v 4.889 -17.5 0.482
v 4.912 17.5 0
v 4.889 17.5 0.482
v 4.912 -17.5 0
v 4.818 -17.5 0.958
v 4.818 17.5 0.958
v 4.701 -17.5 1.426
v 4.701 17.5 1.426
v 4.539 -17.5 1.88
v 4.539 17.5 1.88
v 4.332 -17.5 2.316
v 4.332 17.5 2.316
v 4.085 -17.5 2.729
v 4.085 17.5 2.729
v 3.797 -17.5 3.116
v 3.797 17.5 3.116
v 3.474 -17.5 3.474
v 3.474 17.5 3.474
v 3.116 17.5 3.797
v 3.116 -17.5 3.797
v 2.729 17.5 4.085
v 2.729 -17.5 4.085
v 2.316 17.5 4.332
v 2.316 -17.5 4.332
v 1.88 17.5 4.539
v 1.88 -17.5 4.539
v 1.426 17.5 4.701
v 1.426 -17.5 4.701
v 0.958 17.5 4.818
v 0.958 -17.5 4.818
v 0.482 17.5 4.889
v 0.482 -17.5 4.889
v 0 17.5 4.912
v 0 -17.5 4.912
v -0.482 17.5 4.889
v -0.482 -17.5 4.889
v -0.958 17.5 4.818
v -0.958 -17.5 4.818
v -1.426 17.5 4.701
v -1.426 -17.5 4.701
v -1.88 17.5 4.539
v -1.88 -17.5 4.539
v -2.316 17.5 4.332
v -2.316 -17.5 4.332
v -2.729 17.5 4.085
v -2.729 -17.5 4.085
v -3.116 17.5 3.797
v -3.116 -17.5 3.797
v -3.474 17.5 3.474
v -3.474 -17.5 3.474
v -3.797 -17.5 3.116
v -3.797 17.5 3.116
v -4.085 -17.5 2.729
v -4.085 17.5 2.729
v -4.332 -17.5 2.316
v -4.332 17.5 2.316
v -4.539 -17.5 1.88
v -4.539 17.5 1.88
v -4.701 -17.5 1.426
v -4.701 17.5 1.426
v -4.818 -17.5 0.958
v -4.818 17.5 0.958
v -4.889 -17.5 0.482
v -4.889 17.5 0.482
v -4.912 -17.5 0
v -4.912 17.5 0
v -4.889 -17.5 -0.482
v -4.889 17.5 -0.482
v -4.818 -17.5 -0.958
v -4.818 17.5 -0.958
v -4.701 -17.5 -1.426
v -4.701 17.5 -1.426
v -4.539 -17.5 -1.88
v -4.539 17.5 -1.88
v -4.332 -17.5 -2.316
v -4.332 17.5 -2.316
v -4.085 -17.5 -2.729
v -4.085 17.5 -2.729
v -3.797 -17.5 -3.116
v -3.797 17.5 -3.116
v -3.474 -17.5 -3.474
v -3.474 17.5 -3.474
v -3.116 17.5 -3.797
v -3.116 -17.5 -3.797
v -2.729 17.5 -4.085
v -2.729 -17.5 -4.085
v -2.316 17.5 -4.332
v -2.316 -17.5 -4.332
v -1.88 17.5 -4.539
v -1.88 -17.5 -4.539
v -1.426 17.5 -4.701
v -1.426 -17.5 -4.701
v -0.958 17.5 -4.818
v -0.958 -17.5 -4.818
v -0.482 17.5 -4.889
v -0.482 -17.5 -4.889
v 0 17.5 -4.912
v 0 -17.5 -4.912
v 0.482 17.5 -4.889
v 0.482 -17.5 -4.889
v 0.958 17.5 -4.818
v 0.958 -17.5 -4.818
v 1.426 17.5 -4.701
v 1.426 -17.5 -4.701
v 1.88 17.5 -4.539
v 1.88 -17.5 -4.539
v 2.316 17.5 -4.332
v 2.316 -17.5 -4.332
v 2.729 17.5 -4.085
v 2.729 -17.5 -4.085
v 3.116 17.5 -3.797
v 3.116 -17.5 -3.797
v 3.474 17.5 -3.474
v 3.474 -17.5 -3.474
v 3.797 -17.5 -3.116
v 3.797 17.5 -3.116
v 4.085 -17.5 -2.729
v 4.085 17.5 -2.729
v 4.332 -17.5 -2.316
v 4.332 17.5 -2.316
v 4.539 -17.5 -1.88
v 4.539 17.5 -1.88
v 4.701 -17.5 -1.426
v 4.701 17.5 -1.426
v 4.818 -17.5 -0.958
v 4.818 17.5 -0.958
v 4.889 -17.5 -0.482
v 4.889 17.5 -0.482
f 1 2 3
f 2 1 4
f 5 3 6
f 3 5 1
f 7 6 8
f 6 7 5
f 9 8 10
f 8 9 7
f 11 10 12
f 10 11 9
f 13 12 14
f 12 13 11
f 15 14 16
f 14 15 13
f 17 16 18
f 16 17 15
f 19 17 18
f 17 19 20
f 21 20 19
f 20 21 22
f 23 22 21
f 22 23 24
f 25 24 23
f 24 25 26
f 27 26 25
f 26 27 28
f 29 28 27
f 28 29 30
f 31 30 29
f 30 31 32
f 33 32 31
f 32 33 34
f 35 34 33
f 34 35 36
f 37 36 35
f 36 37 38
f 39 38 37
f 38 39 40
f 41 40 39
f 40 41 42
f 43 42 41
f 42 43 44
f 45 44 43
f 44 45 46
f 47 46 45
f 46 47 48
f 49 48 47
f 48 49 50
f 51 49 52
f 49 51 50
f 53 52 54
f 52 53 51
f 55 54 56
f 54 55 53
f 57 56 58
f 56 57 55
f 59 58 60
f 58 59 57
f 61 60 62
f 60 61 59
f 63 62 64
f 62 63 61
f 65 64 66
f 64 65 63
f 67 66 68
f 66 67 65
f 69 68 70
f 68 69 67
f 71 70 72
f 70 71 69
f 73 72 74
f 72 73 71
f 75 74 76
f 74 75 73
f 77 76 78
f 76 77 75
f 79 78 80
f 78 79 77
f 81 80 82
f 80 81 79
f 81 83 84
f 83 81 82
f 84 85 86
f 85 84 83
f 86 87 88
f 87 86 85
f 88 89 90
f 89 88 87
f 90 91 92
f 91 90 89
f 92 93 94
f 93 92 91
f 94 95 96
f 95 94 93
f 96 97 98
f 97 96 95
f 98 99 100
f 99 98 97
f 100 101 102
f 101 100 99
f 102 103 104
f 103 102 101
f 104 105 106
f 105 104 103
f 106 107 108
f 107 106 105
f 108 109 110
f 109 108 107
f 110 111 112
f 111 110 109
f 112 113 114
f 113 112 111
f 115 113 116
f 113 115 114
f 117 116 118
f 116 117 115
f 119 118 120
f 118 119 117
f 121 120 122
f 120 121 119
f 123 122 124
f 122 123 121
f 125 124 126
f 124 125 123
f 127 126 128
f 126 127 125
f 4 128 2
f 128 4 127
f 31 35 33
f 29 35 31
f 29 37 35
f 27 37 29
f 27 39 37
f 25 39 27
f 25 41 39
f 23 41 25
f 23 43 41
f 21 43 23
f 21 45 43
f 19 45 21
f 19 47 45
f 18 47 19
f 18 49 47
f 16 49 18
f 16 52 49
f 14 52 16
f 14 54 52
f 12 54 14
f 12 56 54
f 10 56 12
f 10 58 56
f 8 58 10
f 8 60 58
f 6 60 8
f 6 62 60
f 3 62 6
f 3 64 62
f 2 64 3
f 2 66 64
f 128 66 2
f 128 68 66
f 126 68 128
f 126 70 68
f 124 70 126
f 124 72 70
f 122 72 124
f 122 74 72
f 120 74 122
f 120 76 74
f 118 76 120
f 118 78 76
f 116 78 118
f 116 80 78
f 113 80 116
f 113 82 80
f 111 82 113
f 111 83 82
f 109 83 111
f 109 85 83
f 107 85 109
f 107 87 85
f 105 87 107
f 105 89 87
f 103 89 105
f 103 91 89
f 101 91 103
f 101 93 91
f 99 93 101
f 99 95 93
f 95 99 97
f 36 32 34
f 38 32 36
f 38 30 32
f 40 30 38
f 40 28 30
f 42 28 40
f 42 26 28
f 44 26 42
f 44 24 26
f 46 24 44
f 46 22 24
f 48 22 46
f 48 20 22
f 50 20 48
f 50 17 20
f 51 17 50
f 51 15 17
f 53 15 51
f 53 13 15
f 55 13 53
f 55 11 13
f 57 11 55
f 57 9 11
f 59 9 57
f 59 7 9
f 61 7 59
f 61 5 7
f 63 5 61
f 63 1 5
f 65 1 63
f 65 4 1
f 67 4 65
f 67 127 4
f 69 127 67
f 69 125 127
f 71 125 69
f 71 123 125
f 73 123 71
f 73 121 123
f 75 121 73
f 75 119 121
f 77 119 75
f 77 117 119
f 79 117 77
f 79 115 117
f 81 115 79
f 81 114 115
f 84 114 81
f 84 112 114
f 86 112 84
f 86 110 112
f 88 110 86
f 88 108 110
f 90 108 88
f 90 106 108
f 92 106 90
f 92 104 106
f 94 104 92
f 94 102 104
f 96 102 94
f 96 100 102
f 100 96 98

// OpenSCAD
// This generates geometry for creating copper pipe fittings
// Licensed under Creative Commons: Attribution, Share-Alike
//		http://creativecommons.org/licenses/by-sa/3.0/
// For attribution you can direct people to the original file on thingiverse:
// 		http://www.thingiverse.com/thing:283551

// ================ variables

//CUSTOMIZER VARIABLES

/* [Main] */

// Rated strength
copper_pipe_class="K"; // [K,L,M,DWV]

// copper_nominal size ("inch") NOTE: All sizes may not be available for all classes,(M is missing a few smaller sizes and DWV only has a few large sizes)
copper_nom_idx=0; // [0:1/4,1:3/8,2:1/2,3:5/8,4:3/4,5:1,6:1 1/4,7:1 1/2,8:2 ,9:2 1/2,10:3]
  
// Length in mm
length=35;

// What to generate
generate=1; // [0:outside fitting,1:outside fitting - boolean diff,2:inside fitting,3:inside fitting - boolean diff,4:inside outside,5:inside outside - boolean diff]

// Tightness of fit, in mm (0=tight 0.3=snug 0.6=loose)
tightness=0.3; // 0.0,1.0

// In points per cylinder
resolution=64;

//CUSTOMIZER VARIABLES END
/* [Hidden] */

// =============== calculated variables
$fn=resolution;

// =============== program

// ---- Data
copper_nom_data=["1/4","3/8","1/2","5/8","3/4","1","1 1/4","1 1/2","2","2 1/2","3"];
copper_class_k_id_data  =[0.305,0.402,0.527,0.652,0.745,0.995,1.245,1.481,1.959,2.435,2.907];
copper_class_k_od_data  =[0.375,0.500,1.000,0.750,0.875,1.125,1.375,1.625,2.125,2.625,3.125];
copper_class_l_id_data  =[0.315,0.430,0.545,0.666,0.785,1.025,1.265,1.505,1.985,2.465,2.945];
copper_class_l_od_data  =[0.375,0.500,1.000,0.750,0.875,1.125,1.375,1.625,2.125,2.625,3.125];
copper_class_m_id_data  =[0.000,0.450,0.569,0.000,0.811,1.055,1.291,1.527,2.009,2.495,2.981];
copper_class_m_od_data  =[0.000,0.500,1.000,0.000,0.875,1.125,1.375,1.625,2.125,2.625,3.125];
copper_class_dwv_id_data=[0.000,0.000,0.000,0.000,0.000,0.000,1.295,1.541,2.041,0.000,3.030];
copper_class_dwv_od_data=[0.000,0.000,0.000,0.000,0.000,0.000,1.375,1.625,2.125,0.000,3.125];
in2mm=25.4;


//---- Functions

/////////////////////////////////////////////////////////
// module create_copper_component()
// This generates geometry for creating copper pipe fittings.
// In general, you should use create_copper() instead because it gives more options.
// copper_pipe_class = Copper pipe class ("K","L","M",or "DWV")
// copper_nom_idx = copper_nominal size index as described by copper_nom_data[] 
// length - Length in mm
// generate - What to generate:
//		0="outside fitting"
//		1="outside fitting - boolean diff"
//		2="inside fitting"
//		3="inside fitting - boolean diff"
// tightness - Tightness of fit, in mm (0=tight 0.3=snug 0.6=loose)
module create_copper_component(copper_pipe_class="K",copper_nom_idx=0,generate=0,tightness=0.02,length=35) {
	dia=
	(in2mm*(copper_pipe_class=="K" ?
		(generate==0||generate==1?copper_class_k_od_data[copper_nom_idx]:copper_class_k_id_data[copper_nom_idx])
		:
		copper_pipe_class=="L" ?
		(generate==0||generate==1?copper_class_l_od_data[copper_nom_idx]:copper_class_l_id_data[copper_nom_idx])
		:
		copper_pipe_class=="M" ?
		(generate==0||generate==1?copper_class_m_od_data[copper_nom_idx]:copper_class_m_id_data[copper_nom_idx])
		:
		(generate==0||generate==1?copper_class_dwv_od_data[copper_nom_idx]:copper_class_dwv_id_data[copper_nom_idx])
	))
	+(generate==2||generate==3?-tightness:tightness);
	echo("========== INFO ==========");
	echo(str("for ",copper_nom_data[copper_nom_idx],"in (copper_nom) pipe"));
	echo(str("created ",dia,"mm dia part"));
	echo(str("including ",(generate==2||generate==3?-tightness:tightness),"mm for fit"));
	echo("==========================");
	// now draw it
	rotate([90,0,0]) if(generate==1||generate==3){
		cylinder(r=dia/2,h=length,center=true);
	}else{
		difference() {
			cube([dia+10,dia+10,length],center=true);
			cylinder(r=dia/2,h=length*2,center=true);
		}
	}
};

/////////////////////////////////////////////////////////
// module create_copper()
// This generates geometry for creating copper pipe fittings.
// Just like create_copper_component() only adds generate options 4 and 5
// copper_pipe_class = Copper pipe class ("K","L","M",or "DWV")
// copper_nom_idx = copper_nominal size index as described by copper_nom_data[] 
// length - Length in mm
// generate - What to generate:
//		0="outside fitting"
//		1="outside fitting - boolean diff"
//		2="inside fitting"
//		3="inside fitting - boolean diff"
//		4="inside outside"
//		5="inside outside - boolean diff"
// tightness - Tightness of fit, in mm (0=tight 0.3=snug 0.6=loose)
module create_copper(copper_pipe_class="K",copper_nom_idx=0,generate=0,tightness=0.02,length=35) {
	if(generate<=3){
		create_copper_component(copper_pipe_class,copper_nom_idx,generate,tightness,length);
	}
	else if(generate==4){
		difference() {
			create_copper_component(copper_pipe_class,copper_nom_idx,1,tightness,length);
			create_copper_component(copper_pipe_class,copper_nom_idx,3,tightness,length*2);
		}
	}
	else{
		union() {
			create_copper_component(copper_pipe_class,copper_nom_idx,0,tightness,length);
			create_copper_component(copper_pipe_class,copper_nom_idx,3,tightness,length);
		}
	}
};

//---- The program
create_copper(copper_pipe_class,copper_nom_idx,generate,tightness,length);
